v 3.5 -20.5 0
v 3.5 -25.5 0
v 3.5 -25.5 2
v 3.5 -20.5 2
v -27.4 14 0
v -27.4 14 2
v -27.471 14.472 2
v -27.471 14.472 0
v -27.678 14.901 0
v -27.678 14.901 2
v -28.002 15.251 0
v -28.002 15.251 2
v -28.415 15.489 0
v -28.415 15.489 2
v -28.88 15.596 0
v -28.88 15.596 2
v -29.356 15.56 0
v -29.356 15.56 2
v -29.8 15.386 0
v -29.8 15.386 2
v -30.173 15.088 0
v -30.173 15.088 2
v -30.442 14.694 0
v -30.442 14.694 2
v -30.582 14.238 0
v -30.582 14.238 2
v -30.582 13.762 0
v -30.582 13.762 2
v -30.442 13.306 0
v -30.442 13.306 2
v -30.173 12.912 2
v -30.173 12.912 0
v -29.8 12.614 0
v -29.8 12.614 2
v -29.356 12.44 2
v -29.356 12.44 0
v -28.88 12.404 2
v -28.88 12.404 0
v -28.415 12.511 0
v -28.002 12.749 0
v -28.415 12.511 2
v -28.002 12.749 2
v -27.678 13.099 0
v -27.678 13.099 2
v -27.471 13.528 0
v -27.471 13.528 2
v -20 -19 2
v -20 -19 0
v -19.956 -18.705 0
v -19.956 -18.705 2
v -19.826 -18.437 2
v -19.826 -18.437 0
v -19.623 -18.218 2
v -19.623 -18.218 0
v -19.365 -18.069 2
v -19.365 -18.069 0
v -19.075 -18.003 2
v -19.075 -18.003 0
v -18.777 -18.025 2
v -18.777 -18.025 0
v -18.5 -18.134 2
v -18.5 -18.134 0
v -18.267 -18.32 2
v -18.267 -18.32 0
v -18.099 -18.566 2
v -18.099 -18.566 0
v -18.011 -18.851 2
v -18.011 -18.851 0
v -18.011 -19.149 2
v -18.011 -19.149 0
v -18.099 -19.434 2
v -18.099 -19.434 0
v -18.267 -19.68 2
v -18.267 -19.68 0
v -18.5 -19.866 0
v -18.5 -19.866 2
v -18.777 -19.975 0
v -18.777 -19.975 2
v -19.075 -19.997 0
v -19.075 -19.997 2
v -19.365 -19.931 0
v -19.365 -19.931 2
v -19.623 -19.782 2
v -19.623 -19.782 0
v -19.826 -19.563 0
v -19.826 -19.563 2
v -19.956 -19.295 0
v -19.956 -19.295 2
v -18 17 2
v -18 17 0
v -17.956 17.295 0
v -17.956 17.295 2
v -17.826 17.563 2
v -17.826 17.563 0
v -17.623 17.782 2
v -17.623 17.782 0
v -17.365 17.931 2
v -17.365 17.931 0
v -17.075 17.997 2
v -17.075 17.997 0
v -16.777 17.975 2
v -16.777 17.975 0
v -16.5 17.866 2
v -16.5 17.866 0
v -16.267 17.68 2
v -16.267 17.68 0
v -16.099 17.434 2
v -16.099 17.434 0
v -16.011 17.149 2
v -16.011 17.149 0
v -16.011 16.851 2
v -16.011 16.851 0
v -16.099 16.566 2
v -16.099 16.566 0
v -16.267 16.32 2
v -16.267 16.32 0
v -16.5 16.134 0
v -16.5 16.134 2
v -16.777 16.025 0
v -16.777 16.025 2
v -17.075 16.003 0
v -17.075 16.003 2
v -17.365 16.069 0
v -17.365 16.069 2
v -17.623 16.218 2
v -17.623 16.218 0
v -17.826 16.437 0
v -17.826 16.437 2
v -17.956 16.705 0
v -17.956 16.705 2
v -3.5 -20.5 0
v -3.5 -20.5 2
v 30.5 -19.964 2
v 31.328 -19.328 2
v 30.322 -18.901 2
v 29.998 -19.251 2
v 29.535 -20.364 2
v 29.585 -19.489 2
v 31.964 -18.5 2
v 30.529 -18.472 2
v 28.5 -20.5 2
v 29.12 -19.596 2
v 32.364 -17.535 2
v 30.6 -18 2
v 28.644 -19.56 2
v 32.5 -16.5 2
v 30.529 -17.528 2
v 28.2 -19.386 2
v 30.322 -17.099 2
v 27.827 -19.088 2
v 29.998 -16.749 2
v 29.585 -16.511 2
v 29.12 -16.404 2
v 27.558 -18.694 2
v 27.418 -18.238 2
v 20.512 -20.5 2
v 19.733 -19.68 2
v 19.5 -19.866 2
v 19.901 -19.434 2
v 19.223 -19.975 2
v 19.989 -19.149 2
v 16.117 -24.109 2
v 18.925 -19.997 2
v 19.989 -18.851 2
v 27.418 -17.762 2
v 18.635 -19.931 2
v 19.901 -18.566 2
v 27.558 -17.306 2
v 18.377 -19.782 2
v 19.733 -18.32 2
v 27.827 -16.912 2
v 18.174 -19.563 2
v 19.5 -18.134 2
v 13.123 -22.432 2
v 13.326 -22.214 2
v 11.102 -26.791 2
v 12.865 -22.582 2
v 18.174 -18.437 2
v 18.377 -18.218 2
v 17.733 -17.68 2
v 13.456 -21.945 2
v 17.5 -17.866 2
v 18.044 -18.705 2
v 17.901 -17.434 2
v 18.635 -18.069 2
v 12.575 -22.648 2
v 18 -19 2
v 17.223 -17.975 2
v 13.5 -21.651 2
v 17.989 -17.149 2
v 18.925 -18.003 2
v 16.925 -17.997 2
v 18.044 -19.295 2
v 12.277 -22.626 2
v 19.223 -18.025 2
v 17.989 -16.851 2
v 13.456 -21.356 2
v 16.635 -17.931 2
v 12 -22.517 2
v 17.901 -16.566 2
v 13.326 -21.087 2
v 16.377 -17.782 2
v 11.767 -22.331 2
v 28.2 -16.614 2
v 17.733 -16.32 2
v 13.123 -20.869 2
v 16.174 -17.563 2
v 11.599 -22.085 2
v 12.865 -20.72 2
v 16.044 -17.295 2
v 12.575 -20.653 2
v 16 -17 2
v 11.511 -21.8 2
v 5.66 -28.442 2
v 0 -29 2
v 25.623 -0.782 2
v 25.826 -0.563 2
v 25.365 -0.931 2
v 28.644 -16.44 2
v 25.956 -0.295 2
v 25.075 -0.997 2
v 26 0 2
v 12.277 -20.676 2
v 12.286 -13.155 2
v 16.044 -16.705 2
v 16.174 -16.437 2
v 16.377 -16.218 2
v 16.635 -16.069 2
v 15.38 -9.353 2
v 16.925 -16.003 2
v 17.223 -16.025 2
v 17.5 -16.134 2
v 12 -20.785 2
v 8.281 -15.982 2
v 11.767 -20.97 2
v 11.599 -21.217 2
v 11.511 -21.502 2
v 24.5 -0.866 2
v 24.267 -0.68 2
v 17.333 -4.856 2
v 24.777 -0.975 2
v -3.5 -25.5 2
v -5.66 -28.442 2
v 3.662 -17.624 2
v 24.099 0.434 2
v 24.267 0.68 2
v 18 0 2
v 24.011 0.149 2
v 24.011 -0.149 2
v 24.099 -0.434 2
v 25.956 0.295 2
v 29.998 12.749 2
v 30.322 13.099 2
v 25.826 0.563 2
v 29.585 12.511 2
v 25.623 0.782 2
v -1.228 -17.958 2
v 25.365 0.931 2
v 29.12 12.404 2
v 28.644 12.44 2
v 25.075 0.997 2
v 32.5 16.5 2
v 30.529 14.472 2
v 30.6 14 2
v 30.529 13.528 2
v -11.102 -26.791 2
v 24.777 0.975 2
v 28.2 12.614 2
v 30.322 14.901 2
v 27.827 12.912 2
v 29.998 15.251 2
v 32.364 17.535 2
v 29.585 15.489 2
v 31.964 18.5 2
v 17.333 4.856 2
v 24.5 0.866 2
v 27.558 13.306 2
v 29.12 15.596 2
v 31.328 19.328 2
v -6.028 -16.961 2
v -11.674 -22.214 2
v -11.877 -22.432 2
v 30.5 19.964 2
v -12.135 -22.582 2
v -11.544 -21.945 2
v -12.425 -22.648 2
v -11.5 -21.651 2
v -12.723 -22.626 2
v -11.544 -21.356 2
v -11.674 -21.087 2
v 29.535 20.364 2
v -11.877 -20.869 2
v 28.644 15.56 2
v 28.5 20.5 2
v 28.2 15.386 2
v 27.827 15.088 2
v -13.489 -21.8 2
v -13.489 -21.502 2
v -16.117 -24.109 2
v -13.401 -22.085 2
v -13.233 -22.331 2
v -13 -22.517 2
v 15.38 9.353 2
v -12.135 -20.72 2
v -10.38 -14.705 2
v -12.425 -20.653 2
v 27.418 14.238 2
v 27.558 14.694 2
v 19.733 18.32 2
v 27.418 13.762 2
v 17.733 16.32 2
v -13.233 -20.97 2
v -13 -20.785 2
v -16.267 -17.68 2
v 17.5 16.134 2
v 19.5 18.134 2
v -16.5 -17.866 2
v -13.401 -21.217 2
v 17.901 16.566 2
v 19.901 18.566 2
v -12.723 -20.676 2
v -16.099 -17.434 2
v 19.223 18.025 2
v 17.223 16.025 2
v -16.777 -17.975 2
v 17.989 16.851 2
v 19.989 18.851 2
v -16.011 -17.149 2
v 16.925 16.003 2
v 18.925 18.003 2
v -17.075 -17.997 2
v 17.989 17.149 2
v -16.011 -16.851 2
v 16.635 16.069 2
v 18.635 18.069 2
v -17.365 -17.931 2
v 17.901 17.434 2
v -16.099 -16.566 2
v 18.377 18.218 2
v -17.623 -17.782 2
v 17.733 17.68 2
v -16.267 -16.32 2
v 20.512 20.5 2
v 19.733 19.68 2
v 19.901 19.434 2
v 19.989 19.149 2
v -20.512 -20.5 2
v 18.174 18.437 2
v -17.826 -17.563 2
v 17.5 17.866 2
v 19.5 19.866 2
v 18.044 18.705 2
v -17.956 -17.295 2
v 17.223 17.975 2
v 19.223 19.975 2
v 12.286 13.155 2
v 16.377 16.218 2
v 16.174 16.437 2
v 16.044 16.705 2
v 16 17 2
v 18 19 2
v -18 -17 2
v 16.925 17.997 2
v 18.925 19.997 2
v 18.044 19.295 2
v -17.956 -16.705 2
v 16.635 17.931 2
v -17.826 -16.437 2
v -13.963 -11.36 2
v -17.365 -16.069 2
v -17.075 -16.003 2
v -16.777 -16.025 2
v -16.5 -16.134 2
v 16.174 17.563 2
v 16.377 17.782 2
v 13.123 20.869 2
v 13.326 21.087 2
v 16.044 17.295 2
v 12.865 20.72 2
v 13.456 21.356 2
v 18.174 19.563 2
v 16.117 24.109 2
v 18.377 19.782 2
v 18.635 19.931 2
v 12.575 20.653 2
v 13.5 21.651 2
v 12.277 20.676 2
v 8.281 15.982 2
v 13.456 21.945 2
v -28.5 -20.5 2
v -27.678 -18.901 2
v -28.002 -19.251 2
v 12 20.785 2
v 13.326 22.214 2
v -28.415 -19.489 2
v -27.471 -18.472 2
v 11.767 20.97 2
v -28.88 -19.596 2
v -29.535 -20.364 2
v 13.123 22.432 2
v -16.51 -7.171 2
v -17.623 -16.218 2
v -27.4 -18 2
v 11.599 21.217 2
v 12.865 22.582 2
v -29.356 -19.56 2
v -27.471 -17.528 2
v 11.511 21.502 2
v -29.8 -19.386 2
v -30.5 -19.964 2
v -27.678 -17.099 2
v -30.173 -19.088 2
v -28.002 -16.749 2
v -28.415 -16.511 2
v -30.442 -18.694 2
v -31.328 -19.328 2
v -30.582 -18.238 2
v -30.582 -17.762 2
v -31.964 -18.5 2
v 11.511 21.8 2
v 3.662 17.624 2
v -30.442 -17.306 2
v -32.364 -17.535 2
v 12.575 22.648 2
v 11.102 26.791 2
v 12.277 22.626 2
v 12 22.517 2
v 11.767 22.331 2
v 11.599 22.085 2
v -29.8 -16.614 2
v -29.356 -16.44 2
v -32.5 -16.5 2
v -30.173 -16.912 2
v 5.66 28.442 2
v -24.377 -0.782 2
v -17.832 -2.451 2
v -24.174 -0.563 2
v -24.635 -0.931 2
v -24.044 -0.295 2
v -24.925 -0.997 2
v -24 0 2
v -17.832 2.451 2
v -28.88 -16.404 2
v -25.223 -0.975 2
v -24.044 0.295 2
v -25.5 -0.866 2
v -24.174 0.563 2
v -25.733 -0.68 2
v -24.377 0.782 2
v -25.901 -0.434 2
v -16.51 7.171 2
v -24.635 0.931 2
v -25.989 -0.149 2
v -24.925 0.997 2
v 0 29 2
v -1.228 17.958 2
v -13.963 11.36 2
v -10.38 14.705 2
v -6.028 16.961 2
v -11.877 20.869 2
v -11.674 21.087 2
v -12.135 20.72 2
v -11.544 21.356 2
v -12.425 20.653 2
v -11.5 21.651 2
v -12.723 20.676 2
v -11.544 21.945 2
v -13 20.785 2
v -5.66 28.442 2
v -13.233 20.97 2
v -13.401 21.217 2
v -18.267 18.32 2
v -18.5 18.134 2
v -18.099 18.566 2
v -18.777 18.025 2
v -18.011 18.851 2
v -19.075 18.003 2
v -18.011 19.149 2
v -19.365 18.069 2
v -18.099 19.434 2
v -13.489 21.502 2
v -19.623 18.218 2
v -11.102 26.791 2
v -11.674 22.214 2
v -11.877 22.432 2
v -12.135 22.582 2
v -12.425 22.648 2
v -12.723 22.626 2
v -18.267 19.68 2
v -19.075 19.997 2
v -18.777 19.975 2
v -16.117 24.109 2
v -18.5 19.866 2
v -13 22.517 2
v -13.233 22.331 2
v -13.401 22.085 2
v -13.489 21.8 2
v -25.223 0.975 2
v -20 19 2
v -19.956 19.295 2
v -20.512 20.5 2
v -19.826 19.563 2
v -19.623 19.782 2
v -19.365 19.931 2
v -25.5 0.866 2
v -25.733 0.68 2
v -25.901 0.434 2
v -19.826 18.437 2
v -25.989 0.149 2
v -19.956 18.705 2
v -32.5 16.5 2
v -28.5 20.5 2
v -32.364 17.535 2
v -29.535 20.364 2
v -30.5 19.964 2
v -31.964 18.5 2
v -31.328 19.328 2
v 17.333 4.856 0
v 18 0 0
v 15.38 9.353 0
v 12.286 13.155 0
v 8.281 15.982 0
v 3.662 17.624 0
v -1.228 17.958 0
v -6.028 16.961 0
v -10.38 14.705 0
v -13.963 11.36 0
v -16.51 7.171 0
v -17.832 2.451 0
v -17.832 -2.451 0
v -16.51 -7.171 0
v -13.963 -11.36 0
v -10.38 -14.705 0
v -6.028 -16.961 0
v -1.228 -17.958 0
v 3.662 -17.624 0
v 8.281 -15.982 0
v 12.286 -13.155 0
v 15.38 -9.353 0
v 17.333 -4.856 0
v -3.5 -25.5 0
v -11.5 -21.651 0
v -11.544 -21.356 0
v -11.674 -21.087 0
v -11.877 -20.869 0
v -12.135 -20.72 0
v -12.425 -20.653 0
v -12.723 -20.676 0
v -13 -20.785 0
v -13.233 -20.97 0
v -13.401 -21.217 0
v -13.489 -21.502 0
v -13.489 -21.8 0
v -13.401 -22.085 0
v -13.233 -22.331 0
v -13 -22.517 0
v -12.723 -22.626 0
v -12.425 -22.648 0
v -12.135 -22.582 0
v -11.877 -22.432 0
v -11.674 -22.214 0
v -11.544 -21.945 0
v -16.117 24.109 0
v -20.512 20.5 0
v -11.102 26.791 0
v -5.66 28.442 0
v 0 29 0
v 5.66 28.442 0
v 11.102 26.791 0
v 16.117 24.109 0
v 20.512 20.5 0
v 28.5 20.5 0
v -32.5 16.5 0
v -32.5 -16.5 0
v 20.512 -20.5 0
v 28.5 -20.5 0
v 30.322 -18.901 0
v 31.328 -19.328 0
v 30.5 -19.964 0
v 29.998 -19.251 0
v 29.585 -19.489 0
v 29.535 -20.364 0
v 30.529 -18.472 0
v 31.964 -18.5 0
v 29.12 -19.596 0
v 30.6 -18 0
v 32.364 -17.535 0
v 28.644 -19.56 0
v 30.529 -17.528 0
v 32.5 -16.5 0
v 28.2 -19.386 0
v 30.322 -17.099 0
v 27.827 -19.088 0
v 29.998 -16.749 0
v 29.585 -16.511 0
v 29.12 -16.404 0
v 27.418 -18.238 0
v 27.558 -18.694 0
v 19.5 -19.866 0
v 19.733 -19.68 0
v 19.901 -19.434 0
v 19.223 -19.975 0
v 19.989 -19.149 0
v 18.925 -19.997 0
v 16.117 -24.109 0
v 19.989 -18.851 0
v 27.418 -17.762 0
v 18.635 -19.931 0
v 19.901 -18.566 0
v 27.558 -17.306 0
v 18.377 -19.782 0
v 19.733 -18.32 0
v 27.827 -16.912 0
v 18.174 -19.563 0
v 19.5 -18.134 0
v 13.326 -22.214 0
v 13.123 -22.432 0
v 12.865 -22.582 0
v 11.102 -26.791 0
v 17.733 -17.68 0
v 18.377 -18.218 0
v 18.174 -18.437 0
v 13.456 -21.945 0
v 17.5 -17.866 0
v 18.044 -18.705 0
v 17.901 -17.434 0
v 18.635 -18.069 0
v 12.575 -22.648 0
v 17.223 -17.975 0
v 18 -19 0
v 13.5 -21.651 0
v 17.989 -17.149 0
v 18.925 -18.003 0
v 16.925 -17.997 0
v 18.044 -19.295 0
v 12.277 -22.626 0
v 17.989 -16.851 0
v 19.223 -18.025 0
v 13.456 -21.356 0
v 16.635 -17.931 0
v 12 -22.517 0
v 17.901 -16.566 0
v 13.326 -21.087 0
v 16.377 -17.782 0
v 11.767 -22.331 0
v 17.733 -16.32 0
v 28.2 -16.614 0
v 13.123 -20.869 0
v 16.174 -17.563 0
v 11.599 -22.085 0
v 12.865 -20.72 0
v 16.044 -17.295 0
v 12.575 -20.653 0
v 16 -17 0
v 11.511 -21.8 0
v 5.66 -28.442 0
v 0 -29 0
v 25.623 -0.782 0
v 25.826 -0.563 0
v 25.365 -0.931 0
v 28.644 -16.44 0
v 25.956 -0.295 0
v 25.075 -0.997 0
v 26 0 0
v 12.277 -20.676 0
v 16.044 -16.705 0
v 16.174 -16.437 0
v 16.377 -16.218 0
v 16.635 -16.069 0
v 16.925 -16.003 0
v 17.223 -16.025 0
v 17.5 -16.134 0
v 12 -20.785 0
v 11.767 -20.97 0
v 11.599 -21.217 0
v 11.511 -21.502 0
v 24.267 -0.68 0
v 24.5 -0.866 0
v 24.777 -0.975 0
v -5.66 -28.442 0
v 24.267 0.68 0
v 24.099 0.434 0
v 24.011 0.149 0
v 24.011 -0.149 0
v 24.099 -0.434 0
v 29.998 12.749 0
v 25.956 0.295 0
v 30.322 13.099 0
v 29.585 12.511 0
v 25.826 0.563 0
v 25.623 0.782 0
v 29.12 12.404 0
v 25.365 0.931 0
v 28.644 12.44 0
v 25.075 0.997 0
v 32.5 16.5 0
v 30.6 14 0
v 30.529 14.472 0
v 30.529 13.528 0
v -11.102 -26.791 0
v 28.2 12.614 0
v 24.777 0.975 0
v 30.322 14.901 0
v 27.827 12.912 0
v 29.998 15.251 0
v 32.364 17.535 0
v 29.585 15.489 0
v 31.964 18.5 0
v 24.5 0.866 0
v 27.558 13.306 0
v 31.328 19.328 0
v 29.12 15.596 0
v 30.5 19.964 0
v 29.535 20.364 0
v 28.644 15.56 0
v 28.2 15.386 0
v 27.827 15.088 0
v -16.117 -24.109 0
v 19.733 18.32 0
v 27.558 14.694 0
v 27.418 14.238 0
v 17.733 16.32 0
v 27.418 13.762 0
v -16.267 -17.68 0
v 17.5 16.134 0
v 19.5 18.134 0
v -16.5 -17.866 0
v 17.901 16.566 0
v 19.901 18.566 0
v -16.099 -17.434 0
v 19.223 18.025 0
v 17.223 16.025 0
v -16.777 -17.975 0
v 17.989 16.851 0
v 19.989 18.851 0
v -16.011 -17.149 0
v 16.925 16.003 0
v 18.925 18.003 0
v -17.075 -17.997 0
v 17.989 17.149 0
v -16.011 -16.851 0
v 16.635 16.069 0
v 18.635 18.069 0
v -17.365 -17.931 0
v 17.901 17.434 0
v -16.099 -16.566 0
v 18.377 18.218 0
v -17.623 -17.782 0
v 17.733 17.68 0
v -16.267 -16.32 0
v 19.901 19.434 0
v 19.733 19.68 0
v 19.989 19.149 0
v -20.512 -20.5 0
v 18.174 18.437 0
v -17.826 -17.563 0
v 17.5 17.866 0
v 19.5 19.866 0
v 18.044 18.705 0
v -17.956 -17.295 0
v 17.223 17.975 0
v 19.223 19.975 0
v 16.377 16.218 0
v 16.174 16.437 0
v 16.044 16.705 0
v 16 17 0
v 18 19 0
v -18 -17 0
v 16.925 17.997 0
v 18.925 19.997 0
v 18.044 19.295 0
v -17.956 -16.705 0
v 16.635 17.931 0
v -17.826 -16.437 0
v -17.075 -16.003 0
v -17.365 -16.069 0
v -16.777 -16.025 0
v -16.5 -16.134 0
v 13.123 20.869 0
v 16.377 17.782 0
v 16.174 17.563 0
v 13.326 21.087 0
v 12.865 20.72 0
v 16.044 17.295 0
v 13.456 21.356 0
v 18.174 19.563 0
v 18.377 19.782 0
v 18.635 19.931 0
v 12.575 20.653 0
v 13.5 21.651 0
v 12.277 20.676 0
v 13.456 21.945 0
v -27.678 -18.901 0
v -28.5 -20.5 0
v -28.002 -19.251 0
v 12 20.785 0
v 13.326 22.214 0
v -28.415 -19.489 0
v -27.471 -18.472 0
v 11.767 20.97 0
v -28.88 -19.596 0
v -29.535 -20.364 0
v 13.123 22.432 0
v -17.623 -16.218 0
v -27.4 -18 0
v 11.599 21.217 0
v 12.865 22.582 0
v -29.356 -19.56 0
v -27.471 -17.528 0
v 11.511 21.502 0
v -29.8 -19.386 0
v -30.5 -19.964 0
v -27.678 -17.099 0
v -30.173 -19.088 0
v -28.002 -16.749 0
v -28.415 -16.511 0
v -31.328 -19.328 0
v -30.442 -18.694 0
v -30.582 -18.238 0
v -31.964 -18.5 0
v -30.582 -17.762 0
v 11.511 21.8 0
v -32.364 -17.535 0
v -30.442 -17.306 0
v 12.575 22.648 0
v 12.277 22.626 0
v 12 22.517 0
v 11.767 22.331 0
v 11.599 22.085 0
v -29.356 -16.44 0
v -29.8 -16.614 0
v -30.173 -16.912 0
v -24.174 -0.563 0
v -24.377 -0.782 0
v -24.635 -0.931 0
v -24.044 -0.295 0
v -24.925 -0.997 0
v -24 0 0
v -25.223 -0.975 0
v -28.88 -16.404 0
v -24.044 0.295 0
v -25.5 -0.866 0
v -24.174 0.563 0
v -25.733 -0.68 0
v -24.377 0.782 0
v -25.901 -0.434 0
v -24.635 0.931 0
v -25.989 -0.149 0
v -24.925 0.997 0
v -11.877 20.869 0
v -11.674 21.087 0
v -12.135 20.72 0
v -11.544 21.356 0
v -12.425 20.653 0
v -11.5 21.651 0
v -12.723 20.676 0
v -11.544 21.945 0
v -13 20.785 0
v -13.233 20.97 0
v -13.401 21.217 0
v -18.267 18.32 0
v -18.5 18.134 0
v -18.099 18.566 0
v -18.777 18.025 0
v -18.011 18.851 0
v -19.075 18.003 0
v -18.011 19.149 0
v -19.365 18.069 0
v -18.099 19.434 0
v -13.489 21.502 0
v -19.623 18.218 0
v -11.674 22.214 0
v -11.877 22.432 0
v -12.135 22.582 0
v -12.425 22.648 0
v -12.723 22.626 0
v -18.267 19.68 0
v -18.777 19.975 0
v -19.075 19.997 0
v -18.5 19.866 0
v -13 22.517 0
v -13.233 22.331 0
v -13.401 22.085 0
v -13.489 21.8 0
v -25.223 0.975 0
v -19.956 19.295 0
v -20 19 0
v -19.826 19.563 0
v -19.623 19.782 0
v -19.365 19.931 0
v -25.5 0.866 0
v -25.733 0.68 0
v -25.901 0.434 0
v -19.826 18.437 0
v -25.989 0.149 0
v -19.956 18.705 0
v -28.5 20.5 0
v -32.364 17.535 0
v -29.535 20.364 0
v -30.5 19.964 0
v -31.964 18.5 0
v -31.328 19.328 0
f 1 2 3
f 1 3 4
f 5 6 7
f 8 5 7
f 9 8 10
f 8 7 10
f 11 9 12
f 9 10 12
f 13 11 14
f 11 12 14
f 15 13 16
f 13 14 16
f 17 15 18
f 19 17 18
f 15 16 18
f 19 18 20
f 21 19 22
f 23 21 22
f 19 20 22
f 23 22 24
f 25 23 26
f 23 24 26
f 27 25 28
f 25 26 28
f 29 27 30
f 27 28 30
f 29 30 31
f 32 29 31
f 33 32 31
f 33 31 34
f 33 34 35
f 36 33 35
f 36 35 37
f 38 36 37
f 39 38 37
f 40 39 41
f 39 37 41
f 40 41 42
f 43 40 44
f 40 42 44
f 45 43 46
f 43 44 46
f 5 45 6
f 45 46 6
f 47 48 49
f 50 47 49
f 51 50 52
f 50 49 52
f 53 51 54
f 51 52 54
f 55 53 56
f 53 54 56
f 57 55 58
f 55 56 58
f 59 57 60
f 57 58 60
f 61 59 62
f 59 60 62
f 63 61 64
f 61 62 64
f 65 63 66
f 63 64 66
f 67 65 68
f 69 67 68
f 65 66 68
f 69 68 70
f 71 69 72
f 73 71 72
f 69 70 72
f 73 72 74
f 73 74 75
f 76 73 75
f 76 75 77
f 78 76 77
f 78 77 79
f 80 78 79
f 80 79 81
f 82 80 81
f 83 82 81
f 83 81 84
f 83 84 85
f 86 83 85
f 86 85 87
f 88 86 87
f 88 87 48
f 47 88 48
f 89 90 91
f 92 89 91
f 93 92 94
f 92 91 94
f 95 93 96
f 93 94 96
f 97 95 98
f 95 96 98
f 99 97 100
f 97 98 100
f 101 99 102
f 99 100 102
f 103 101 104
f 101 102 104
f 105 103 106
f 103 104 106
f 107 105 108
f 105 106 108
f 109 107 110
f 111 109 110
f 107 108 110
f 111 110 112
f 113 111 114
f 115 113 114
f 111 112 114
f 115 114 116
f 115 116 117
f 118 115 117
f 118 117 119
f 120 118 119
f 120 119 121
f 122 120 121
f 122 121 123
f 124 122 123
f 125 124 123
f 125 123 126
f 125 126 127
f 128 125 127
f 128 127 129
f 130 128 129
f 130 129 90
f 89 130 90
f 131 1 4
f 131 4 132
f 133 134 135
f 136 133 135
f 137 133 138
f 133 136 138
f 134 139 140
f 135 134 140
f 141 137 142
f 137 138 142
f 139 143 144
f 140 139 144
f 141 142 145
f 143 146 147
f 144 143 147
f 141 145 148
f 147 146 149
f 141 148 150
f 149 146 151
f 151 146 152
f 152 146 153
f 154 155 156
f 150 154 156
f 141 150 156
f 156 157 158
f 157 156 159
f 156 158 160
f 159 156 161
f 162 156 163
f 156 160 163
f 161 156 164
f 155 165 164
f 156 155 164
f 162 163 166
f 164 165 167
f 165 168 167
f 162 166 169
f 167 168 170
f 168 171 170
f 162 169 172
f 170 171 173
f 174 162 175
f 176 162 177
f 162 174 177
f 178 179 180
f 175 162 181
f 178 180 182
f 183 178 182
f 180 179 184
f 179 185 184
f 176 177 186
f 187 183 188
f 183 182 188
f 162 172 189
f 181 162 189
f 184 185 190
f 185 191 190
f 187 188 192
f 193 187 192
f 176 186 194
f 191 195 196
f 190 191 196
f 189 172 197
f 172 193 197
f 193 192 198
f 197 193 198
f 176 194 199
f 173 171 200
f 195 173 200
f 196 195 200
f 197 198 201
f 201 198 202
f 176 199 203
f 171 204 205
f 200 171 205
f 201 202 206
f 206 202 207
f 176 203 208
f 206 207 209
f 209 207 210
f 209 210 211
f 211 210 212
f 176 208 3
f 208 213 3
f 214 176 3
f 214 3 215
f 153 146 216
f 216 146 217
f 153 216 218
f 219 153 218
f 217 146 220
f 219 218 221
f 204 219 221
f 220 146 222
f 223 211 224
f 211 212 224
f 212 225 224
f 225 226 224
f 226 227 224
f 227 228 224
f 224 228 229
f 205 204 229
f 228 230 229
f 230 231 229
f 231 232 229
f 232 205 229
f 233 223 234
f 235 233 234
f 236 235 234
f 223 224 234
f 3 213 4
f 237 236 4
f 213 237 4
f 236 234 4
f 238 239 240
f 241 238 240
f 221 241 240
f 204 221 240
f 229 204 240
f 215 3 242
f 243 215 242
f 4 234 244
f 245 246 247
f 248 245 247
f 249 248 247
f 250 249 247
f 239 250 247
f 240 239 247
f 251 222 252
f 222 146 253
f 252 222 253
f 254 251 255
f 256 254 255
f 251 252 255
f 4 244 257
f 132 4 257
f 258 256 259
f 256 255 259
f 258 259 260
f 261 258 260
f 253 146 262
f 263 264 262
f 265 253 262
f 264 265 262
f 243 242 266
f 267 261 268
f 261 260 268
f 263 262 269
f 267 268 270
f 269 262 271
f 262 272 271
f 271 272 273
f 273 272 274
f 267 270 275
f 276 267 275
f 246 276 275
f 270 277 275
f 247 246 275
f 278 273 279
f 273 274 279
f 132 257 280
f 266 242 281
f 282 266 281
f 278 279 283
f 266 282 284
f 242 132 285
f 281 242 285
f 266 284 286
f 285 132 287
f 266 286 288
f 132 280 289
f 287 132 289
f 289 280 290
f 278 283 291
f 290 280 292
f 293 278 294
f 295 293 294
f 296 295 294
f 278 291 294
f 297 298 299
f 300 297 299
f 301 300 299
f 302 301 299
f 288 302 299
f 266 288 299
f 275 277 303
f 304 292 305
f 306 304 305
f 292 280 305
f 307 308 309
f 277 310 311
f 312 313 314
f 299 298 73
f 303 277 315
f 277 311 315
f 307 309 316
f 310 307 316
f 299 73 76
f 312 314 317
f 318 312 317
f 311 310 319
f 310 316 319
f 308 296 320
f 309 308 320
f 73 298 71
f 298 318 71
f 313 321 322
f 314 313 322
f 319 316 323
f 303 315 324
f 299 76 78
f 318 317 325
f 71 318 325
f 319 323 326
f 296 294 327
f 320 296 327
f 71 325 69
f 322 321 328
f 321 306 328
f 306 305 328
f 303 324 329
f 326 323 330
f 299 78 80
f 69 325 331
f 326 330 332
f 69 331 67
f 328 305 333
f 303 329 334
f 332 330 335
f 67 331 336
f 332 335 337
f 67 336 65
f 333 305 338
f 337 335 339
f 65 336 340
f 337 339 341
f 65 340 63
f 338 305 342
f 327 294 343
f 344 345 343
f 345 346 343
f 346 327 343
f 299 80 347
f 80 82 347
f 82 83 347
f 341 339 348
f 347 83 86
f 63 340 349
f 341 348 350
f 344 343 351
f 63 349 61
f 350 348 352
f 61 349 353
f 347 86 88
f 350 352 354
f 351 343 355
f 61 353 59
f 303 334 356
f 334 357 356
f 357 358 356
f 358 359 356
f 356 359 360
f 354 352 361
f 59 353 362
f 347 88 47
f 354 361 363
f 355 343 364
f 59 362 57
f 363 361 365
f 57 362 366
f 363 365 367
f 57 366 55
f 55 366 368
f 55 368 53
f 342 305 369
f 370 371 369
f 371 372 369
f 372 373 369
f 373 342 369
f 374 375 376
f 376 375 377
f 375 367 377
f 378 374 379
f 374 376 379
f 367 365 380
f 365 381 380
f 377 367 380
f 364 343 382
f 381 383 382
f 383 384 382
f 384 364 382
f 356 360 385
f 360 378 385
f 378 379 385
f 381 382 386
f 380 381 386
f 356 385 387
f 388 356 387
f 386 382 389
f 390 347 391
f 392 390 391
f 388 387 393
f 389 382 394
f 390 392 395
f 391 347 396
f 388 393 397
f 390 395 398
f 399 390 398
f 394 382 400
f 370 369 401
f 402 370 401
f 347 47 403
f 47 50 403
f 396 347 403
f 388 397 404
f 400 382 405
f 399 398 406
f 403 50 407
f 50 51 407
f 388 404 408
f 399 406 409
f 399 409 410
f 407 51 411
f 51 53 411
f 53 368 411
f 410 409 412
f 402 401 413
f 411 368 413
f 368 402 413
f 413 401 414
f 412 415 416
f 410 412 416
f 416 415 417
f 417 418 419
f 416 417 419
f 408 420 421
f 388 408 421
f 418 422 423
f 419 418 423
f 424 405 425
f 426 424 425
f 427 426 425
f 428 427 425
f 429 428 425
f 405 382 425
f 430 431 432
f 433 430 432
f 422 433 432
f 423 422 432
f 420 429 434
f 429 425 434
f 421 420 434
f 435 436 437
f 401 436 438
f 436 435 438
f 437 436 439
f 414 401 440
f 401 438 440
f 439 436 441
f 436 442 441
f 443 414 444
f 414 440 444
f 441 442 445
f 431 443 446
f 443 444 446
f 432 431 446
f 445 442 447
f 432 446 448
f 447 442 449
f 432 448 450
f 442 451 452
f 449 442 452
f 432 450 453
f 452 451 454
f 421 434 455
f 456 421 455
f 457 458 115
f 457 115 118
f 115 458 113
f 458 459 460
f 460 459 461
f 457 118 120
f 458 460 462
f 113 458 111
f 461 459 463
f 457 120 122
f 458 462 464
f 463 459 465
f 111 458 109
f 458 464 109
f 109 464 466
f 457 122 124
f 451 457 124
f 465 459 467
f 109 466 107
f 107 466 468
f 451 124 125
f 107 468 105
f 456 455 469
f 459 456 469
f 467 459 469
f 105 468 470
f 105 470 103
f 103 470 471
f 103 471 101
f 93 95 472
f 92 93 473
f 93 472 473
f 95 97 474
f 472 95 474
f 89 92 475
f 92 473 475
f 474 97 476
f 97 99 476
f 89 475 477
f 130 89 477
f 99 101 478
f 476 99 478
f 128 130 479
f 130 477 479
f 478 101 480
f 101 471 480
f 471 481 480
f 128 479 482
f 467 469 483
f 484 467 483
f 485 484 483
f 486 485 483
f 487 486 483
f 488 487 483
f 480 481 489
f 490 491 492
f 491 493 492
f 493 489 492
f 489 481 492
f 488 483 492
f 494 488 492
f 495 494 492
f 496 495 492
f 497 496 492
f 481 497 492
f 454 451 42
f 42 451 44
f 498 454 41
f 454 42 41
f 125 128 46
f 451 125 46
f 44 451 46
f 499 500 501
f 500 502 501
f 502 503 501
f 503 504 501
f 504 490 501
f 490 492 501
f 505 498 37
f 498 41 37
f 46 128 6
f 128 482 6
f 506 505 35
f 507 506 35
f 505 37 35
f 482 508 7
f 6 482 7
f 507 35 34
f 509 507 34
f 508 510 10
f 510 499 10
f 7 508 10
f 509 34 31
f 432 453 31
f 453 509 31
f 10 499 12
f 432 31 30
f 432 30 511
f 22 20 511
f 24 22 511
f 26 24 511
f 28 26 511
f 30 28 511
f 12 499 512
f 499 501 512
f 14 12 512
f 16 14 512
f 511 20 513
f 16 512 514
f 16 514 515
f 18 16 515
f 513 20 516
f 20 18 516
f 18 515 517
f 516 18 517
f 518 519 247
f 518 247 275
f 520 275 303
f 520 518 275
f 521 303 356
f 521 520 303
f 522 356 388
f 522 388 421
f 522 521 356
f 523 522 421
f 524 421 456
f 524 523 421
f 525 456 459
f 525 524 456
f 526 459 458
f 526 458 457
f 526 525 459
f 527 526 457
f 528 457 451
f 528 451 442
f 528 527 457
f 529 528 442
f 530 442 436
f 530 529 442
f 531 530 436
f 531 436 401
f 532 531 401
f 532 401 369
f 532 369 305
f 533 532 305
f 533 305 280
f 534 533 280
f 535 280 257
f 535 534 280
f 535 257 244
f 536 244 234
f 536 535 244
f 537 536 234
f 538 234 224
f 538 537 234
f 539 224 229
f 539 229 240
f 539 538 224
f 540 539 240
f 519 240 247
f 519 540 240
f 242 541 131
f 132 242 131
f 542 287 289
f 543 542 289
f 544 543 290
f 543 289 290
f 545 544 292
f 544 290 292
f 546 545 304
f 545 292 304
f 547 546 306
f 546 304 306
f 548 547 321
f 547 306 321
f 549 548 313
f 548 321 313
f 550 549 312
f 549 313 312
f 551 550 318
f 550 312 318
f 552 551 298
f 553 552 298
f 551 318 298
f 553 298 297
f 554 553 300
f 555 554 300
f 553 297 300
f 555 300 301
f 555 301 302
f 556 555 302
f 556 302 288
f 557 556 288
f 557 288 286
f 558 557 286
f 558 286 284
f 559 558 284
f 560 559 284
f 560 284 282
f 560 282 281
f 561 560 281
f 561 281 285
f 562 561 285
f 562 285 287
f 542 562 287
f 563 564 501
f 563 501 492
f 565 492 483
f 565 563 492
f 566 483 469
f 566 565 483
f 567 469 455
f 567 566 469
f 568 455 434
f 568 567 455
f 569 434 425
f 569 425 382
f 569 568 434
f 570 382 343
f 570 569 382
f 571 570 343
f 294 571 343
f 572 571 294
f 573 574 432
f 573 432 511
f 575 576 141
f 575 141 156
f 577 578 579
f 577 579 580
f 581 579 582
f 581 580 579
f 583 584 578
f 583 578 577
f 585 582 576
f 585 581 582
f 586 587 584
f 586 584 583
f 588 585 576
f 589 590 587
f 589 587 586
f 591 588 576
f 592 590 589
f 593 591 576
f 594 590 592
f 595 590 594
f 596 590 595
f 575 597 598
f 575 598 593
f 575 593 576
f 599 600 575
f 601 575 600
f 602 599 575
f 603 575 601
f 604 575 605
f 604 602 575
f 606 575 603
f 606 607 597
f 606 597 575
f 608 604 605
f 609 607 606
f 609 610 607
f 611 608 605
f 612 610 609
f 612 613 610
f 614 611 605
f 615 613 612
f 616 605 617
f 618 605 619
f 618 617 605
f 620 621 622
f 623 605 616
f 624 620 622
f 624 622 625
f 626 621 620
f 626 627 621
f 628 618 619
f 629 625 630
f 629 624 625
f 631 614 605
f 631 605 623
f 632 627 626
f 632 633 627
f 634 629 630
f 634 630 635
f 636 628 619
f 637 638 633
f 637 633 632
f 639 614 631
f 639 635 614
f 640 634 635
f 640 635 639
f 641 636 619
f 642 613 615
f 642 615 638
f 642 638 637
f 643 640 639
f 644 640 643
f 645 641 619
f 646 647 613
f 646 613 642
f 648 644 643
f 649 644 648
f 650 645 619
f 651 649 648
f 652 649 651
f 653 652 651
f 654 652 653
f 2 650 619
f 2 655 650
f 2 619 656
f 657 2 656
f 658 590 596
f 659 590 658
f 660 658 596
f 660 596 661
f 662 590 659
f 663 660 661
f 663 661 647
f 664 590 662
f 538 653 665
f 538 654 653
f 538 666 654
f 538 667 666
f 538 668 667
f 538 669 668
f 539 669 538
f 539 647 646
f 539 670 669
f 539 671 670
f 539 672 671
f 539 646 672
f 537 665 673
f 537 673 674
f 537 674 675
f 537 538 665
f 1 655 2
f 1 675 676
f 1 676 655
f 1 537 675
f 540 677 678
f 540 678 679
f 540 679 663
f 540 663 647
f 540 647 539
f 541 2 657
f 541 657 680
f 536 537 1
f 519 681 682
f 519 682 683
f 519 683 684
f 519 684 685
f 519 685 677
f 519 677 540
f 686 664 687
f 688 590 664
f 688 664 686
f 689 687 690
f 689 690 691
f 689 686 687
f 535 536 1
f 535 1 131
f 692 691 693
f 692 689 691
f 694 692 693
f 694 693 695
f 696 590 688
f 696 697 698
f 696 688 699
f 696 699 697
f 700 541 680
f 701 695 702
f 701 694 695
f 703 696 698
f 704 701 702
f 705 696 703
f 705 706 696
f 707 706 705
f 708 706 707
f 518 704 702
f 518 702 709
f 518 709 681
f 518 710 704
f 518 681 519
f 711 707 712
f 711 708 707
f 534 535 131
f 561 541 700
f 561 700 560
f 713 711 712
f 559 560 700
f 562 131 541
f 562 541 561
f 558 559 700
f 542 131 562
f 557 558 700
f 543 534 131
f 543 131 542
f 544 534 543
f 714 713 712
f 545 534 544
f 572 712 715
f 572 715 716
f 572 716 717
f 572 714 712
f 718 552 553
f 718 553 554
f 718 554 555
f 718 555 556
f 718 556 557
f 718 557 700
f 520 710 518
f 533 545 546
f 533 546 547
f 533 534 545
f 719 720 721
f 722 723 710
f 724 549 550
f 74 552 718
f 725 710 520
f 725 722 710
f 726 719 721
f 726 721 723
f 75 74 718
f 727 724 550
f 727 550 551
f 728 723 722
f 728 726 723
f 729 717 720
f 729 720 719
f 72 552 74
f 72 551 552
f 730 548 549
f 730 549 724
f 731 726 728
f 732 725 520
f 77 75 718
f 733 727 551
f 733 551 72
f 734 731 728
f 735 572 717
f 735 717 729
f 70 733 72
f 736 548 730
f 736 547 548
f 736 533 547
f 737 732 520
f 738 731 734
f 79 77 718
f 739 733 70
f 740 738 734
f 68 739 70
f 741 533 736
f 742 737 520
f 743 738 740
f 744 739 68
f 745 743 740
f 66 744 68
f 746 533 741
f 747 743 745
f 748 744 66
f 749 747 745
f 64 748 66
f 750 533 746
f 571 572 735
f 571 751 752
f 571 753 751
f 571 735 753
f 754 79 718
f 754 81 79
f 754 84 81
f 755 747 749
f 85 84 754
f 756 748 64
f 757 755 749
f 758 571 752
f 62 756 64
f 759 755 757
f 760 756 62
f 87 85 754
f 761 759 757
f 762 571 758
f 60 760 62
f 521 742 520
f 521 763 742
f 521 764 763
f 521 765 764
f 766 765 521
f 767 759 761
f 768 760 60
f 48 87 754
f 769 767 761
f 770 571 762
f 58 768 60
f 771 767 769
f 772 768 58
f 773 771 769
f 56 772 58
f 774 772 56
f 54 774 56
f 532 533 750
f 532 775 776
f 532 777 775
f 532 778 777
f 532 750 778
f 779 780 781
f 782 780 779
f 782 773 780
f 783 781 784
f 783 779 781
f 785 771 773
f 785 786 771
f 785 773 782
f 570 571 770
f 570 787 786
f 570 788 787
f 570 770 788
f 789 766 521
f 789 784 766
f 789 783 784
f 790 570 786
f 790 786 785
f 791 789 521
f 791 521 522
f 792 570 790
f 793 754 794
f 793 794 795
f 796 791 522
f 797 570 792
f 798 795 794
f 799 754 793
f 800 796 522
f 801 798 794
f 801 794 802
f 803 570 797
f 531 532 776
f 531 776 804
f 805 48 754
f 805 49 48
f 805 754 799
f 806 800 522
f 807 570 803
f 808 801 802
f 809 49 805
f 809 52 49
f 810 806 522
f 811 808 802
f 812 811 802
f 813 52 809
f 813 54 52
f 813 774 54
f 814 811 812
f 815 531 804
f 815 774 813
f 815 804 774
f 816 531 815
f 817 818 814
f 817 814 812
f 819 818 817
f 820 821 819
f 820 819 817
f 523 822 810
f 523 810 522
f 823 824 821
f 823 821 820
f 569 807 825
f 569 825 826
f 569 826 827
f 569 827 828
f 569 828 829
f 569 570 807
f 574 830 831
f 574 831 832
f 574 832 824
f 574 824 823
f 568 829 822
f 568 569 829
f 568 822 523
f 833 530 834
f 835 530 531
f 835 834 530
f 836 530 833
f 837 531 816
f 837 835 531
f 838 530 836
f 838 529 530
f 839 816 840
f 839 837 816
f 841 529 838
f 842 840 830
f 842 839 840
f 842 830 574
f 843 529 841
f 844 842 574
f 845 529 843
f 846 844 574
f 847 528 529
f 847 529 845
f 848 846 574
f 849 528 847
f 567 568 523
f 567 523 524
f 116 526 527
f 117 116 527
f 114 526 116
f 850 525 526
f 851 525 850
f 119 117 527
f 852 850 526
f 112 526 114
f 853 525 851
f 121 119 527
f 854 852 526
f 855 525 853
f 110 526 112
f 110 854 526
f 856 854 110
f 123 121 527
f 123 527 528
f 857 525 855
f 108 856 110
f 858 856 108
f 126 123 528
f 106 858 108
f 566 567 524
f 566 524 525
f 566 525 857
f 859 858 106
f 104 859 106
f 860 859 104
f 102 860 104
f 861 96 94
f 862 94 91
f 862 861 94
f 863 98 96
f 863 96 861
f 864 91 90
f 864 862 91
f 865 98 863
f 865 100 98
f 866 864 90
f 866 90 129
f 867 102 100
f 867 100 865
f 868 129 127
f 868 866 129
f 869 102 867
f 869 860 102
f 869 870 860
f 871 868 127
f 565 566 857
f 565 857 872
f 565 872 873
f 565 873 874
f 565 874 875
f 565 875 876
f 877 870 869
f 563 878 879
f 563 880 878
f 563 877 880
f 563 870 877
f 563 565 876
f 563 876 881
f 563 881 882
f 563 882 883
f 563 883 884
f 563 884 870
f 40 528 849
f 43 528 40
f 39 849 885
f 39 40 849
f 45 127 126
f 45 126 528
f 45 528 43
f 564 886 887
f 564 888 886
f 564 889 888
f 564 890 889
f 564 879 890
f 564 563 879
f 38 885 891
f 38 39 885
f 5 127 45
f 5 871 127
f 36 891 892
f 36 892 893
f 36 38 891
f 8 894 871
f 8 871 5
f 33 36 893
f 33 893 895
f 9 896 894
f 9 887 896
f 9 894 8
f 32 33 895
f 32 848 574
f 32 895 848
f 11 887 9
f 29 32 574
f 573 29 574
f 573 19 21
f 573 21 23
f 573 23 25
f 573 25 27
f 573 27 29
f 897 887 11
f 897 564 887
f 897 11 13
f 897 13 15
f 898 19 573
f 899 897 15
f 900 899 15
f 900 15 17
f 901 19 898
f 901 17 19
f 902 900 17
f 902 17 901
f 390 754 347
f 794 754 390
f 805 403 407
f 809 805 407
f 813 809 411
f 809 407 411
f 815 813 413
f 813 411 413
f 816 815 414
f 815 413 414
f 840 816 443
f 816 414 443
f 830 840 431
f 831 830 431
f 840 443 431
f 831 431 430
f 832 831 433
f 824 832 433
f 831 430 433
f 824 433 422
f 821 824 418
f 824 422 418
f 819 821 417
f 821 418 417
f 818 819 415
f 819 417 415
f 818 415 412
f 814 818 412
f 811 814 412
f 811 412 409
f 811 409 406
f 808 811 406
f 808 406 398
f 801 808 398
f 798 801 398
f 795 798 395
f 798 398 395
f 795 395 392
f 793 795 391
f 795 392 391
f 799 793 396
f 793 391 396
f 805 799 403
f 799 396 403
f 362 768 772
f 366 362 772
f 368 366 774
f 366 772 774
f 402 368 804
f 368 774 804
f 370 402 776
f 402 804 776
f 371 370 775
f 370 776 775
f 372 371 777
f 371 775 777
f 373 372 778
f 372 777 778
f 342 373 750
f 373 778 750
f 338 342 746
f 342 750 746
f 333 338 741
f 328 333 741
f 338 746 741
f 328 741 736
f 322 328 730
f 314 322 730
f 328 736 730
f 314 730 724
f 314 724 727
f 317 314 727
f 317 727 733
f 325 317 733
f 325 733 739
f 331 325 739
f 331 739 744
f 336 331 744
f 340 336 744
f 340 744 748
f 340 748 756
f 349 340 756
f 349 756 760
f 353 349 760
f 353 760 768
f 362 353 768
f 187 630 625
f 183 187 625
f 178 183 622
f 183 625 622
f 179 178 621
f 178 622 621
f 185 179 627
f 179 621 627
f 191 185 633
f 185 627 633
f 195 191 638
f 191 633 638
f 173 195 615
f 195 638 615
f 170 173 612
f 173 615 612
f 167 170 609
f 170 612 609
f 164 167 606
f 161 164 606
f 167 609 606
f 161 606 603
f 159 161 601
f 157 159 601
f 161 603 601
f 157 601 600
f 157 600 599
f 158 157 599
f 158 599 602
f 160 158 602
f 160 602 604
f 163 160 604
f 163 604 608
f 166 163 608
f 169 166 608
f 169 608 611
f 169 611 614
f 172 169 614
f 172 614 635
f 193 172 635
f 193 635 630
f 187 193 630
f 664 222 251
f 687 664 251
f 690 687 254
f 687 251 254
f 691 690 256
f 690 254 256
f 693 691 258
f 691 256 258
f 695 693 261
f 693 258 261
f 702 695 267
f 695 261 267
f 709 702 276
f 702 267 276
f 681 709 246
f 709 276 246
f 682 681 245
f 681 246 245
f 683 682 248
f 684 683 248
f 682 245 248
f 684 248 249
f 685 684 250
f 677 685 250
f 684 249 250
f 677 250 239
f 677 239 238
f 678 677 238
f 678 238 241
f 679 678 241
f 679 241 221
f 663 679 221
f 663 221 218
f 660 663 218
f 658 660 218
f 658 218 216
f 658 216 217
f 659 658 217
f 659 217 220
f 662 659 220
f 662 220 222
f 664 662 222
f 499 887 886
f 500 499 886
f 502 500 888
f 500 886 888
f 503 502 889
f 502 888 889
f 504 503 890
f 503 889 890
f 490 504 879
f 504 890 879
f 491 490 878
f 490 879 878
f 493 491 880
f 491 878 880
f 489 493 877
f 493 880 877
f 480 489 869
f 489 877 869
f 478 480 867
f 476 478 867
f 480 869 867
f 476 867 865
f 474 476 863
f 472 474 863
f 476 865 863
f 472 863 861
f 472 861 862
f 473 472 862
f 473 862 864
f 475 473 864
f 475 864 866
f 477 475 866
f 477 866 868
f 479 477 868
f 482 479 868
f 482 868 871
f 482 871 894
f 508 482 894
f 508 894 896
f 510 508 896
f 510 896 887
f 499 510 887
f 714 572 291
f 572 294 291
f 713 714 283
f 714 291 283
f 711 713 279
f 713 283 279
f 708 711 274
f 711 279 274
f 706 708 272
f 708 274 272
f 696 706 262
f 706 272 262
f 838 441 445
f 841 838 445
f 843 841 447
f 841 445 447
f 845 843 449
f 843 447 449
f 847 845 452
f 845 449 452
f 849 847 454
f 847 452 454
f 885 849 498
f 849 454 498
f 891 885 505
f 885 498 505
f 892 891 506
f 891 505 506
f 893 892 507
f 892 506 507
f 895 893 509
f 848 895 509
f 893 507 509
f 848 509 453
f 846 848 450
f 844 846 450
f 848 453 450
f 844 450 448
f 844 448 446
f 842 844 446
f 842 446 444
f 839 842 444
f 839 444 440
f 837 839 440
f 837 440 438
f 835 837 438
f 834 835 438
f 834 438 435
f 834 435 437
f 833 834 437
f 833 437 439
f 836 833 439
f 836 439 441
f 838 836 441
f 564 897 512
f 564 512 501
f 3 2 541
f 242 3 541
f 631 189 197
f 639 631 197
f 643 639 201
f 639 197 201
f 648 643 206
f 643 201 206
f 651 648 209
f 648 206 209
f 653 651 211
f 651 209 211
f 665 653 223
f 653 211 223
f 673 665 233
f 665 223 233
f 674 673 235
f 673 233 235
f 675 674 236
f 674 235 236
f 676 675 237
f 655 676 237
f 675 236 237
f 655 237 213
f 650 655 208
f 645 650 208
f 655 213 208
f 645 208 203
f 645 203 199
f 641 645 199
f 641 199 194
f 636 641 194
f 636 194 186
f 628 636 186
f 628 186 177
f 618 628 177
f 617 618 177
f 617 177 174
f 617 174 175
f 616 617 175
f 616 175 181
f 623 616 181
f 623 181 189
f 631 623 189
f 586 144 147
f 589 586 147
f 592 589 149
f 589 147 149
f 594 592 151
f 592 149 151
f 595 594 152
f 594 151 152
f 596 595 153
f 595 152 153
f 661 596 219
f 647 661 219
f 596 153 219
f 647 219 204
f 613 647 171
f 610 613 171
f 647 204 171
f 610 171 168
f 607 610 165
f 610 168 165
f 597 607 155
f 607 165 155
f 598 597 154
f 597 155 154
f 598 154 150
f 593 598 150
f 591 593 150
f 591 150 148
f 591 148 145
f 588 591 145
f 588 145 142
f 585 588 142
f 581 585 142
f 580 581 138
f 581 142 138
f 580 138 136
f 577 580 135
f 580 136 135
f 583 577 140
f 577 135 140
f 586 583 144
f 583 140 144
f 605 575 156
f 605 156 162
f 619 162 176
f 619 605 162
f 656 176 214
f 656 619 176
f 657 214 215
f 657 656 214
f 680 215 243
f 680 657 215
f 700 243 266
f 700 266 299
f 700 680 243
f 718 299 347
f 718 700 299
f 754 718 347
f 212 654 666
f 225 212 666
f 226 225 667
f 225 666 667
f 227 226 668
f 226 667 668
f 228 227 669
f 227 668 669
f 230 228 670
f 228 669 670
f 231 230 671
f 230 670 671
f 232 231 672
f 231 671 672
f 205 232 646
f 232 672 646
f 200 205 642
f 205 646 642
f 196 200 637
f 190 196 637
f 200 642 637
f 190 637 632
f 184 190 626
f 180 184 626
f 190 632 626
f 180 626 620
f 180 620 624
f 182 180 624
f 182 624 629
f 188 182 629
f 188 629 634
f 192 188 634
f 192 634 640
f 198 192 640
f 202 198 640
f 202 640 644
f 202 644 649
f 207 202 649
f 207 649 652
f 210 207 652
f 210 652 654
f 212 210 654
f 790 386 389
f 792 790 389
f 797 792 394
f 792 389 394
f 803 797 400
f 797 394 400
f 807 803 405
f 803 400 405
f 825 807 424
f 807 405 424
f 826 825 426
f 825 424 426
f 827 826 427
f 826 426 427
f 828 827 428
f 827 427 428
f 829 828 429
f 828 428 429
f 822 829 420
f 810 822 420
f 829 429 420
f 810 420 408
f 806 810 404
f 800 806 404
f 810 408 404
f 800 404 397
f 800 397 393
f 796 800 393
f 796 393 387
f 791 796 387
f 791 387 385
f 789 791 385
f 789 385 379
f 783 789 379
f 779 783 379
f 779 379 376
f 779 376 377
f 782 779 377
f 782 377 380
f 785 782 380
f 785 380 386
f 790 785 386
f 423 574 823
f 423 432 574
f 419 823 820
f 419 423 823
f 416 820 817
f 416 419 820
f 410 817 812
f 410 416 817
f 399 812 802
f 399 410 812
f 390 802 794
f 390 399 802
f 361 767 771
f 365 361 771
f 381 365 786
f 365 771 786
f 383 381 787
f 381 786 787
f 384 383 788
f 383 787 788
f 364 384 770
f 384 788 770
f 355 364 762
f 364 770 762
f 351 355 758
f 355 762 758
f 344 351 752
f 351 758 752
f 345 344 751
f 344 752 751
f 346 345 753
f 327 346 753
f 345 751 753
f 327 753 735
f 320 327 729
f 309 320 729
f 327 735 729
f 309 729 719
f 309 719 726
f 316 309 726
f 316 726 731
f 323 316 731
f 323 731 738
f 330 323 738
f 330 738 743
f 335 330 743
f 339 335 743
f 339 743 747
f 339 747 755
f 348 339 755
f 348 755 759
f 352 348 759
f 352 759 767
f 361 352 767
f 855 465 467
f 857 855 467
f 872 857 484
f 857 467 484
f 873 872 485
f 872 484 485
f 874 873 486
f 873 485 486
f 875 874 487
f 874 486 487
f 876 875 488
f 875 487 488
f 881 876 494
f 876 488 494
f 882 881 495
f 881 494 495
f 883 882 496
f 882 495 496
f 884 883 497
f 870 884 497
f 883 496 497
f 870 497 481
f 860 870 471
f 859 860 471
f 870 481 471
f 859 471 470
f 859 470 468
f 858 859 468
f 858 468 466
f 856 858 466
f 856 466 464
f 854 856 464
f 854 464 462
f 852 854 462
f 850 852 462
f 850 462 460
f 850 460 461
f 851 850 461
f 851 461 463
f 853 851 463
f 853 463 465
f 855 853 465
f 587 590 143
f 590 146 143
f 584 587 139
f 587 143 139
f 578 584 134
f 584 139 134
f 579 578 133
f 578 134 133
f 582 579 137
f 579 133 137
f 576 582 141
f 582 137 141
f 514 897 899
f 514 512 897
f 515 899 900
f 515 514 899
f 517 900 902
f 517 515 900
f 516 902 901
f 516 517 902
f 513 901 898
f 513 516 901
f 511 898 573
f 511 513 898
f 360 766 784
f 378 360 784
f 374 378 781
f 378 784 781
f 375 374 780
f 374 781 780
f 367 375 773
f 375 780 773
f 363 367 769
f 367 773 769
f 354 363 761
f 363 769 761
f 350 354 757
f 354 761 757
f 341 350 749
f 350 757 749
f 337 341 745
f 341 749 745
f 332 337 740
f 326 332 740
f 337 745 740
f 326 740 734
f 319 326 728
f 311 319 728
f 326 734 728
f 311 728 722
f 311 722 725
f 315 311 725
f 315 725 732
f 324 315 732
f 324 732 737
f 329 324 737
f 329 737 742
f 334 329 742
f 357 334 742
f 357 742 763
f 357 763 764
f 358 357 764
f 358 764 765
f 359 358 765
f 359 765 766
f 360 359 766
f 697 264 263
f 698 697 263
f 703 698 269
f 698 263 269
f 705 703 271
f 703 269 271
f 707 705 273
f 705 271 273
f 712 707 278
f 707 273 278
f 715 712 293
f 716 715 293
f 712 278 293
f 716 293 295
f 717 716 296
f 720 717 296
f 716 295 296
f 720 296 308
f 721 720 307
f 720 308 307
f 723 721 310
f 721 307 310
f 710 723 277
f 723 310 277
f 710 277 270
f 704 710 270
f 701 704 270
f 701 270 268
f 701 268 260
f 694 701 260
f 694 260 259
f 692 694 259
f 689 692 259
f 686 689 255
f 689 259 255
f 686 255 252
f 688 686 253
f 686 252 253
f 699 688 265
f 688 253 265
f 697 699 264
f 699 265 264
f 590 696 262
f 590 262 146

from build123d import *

# Parameters (mm, degrees)
SKETCH1_R             = 18
BOSS_EXTRUDE1_DEPTH   = 2
SKETCH2_R             = 1.6
CUT_EXTRUDE1_DEPTH    = 2
F_2_0MM_DOWEL_HOLE1_D = 2
FILLET1_R             = 4
SKETCH_1_W            = 7
SKETCH_1_H            = 5
CUT_EXTRUDE_1_DEPTH   = 44.603325561
F_2_0MM_1_D           = 2


with BuildPart() as part:
    # Sketch1 → Boss-Extrude1 (new body)
    with BuildSketch(Plane.XY):
        with BuildLine():
            Line((-32.5, 20.5), (-20.512191497, 20.5))
            ThreePointArc((-20.512191497, 20.5), (0, 29), (20.512191497, 20.5))
            Line((20.512191497, 20.5), (32.5, 20.5))
            Line((32.5, 20.5), (32.5, -20.5))
            Line((32.5, -20.5), (20.512191497, -20.5))
            ThreePointArc((20.512191497, -20.5), (0, -29), (-20.512191497, -20.5))
            Line((-20.512191497, -20.5), (-32.5, -20.5))
            Line((-32.5, -20.5), (-32.5, 20.5))
        make_face()
        Circle(SKETCH1_R, mode=Mode.SUBTRACT)
    extrude(amount=BOSS_EXTRUDE1_DEPTH)

    # Sketch2 → Cut-Extrude1 (cut)
    with BuildSketch(Plane.XY.offset(2)):
        with Locations((-29, 14)):
            Circle(SKETCH2_R)
        with Locations((-29, -18)):
            Circle(SKETCH2_R)
        with Locations((29, -18)):
            Circle(SKETCH2_R)
        with Locations((29, 14)):
            Circle(SKETCH2_R)
    extrude(amount=-CUT_EXTRUDE1_DEPTH, mode=Mode.SUBTRACT)

    # Ø2.0mm Dowel Hole1 (through all)
    with Locations(Plane(origin=(-19, 19, 2), x_dir=(1, 0, 0), z_dir=(0, 0, 1))):
        with Locations((0, 0), (2, -2), (36, -2), (38, 0), (36, -36), (38, -38), (0, -38), (2, -36)):
            Hole(F_2_0MM_DOWEL_HOLE1_D / 2)

    # Fillet1
    fillet1_edges = [part.edges().sort_by_distance(p)[0] for p in [
        (-32.5, -20.5, 1),
        (-32.5, 20.5, 1),
        (32.5, 20.5, 1),
        (32.5, -20.5, 1),
    ]]
    fillet(fillet1_edges, radius=FILLET1_R)

    # 스케치1 → 컷-돌출1 (cut, through all)
    with BuildSketch(Plane(origin=(0, 0, 0), x_dir=(-1, 0, 0), z_dir=(0, 0, -1))):
        with Locations((0, -23)):
            Rectangle(SKETCH_1_W, SKETCH_1_H)
    extrude(amount=-CUT_EXTRUDE_1_DEPTH, mode=Mode.SUBTRACT)

    # Ø2.0mm 맞춤핀 구멍1 (through all)
    with Locations(Plane(origin=(12.5, 21.650635095, 0), x_dir=(-1, 0, 0), z_dir=(0, 0, -1))):
        with Locations((0, 0), (25, 0), (37.5, -21.650635095), (25, -43.30127019), (0, -43.30127019), (-12.5, -21.650635095)):
            Hole(F_2_0MM_1_D / 2)


solid = part.part
